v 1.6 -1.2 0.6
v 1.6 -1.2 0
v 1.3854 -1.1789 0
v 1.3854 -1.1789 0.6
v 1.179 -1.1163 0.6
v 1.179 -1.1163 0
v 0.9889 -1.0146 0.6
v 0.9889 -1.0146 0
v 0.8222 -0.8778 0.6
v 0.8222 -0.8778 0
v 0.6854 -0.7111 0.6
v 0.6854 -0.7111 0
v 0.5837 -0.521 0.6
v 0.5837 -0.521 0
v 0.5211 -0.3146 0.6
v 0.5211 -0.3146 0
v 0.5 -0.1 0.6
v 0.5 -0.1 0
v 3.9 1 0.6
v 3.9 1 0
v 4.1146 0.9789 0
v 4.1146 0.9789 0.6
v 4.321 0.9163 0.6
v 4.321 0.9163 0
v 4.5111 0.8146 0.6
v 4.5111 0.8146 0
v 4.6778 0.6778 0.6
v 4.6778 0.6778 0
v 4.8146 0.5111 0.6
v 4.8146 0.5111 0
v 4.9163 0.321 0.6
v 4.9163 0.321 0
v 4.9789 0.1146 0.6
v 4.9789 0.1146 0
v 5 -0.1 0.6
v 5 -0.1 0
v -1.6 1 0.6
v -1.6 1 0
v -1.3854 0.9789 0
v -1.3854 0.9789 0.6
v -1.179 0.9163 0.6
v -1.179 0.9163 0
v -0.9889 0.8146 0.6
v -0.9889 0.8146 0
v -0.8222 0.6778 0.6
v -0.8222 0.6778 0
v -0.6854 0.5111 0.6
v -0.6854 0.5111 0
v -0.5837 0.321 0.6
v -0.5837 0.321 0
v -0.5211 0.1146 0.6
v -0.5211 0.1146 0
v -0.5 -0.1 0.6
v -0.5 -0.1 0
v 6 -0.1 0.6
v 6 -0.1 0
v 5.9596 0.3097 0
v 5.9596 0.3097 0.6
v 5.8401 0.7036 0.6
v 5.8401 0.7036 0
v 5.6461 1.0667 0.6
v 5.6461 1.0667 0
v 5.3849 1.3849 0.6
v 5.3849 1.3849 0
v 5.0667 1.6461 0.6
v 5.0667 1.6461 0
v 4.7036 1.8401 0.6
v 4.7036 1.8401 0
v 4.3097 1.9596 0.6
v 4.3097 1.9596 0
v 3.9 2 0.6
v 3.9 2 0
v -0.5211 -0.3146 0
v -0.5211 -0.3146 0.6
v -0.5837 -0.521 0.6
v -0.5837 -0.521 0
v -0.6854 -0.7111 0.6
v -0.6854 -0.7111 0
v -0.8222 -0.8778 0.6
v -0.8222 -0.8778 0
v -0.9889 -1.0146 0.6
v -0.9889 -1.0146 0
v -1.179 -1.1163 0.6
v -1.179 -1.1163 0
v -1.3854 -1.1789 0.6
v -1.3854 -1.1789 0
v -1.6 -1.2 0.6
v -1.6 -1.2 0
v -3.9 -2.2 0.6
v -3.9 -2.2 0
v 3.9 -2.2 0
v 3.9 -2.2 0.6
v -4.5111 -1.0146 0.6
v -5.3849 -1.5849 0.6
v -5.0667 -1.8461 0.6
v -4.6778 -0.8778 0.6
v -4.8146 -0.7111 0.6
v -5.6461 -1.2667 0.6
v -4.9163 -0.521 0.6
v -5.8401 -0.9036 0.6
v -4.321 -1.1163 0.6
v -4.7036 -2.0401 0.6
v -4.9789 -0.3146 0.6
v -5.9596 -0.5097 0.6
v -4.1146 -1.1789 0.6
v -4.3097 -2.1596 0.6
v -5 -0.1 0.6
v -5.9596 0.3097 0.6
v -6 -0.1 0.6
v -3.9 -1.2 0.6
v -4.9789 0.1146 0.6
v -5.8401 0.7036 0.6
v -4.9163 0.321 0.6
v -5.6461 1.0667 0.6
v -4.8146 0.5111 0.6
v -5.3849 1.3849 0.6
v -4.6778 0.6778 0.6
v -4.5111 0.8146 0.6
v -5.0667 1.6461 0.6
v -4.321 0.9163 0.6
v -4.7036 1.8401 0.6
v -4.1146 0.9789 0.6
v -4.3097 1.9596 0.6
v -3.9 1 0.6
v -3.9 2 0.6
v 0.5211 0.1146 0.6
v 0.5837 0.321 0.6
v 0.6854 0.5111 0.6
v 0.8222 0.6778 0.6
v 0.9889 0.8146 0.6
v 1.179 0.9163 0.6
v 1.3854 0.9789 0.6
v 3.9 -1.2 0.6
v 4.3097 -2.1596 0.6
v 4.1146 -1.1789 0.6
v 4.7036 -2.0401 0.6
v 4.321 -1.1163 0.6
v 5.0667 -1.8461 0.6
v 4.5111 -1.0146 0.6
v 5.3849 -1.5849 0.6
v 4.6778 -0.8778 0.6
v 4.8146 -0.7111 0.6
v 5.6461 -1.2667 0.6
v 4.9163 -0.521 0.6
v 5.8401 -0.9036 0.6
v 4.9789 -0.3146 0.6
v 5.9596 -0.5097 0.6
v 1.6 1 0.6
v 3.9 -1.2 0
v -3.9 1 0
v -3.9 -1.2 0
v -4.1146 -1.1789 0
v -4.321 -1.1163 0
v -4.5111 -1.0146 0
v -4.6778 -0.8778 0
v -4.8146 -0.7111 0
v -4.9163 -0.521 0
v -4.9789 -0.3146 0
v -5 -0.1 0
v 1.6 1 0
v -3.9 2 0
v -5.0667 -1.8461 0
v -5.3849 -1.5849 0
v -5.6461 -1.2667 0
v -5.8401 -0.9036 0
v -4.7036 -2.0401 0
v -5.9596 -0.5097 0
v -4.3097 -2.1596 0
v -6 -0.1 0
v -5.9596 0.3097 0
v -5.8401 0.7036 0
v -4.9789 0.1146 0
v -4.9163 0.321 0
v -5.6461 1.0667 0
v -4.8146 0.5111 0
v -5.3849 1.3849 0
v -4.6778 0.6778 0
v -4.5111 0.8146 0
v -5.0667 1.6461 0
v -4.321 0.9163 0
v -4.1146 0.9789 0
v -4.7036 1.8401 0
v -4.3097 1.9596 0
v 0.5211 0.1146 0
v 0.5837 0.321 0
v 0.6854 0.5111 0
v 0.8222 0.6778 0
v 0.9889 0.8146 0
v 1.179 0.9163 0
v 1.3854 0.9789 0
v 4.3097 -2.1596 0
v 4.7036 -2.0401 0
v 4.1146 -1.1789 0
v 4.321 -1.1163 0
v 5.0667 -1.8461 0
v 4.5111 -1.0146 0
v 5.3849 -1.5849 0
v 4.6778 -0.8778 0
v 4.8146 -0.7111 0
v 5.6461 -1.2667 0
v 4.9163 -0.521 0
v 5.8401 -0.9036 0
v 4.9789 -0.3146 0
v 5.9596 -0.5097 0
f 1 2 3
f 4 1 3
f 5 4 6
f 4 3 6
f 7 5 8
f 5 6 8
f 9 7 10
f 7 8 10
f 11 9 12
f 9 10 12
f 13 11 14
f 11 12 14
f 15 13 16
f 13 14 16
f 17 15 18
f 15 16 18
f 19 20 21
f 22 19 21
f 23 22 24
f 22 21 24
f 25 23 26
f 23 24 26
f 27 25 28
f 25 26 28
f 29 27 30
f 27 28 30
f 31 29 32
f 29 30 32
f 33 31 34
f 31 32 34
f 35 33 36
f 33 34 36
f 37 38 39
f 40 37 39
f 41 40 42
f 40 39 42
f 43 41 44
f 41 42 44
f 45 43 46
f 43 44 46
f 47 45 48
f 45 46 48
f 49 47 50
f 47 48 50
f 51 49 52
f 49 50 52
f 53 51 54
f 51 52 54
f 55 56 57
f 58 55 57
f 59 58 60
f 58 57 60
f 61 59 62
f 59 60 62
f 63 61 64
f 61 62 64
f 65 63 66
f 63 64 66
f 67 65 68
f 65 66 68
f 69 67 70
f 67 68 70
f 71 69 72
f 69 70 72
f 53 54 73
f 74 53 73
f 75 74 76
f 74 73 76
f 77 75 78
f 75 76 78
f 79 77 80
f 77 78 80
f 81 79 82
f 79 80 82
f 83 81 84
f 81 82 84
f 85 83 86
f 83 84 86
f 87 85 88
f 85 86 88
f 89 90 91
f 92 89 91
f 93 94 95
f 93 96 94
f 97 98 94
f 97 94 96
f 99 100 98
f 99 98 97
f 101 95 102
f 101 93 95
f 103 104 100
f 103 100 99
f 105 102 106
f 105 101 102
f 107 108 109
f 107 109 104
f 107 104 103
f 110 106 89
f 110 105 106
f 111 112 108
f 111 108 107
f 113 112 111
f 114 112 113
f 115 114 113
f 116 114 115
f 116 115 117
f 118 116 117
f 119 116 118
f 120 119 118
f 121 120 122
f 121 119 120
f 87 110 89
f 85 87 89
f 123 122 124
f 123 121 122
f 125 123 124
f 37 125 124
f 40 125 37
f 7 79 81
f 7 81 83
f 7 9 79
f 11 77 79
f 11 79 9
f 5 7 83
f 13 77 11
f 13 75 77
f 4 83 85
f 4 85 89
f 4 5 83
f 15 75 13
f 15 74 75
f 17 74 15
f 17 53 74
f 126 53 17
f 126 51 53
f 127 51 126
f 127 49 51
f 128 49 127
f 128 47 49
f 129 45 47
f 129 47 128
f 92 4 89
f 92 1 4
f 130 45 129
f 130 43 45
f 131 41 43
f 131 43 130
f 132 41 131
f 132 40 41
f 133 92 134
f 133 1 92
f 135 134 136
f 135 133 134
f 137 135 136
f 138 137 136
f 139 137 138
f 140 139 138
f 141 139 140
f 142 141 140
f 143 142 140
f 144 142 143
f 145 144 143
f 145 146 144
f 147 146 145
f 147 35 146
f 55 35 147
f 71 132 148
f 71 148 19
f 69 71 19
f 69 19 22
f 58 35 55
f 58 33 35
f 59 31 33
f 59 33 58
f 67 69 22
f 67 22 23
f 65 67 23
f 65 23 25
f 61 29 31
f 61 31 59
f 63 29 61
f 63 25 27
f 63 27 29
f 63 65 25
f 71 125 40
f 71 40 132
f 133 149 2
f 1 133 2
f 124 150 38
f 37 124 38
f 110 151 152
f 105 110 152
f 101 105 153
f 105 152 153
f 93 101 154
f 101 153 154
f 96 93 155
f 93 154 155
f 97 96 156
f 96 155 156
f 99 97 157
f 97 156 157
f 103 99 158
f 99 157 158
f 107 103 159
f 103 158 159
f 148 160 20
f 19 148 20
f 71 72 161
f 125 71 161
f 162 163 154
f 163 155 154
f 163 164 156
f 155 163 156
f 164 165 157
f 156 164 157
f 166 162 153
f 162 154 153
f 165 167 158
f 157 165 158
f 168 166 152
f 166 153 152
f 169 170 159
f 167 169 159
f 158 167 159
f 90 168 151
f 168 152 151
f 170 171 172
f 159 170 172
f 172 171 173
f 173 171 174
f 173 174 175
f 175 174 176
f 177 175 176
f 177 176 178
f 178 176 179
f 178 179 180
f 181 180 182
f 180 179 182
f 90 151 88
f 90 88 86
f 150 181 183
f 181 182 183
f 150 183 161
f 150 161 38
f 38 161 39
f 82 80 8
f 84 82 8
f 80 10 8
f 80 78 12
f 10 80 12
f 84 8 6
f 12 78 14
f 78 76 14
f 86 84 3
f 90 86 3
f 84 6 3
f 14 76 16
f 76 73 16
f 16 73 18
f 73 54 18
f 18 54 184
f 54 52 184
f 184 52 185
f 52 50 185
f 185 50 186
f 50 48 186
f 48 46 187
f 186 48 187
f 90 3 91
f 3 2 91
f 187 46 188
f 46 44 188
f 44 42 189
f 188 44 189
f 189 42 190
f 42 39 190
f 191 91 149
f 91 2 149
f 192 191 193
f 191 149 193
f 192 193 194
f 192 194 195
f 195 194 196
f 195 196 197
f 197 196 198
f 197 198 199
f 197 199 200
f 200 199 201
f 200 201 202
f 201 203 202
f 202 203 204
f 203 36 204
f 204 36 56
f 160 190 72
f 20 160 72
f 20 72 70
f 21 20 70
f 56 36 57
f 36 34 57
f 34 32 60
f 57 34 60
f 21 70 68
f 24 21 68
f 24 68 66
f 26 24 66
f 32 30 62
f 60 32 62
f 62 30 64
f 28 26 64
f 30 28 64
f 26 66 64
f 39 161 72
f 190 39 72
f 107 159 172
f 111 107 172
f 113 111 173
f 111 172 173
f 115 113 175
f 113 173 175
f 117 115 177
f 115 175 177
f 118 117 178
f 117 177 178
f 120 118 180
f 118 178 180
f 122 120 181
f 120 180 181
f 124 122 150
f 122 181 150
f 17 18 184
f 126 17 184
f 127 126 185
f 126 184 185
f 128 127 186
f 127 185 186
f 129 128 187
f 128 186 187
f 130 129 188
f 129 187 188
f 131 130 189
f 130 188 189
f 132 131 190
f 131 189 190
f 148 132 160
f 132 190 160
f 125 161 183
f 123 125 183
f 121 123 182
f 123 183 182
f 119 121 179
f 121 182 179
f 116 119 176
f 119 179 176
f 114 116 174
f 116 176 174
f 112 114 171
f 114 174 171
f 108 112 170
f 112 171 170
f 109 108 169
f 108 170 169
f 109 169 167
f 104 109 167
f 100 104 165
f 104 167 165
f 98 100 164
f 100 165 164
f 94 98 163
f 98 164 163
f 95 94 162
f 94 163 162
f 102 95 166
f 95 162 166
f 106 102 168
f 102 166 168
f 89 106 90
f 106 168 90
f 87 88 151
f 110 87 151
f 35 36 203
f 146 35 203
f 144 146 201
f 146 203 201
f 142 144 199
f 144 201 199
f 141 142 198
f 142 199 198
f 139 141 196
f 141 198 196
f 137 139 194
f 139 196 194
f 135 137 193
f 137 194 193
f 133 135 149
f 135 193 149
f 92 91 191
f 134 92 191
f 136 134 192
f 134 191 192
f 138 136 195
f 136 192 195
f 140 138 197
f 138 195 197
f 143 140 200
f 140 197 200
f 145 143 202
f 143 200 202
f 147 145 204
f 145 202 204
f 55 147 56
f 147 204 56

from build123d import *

# Parameters (mm, degrees)
F1_DEPTH = 0.6


with BuildPart() as f1:
    # F0 (on Top) → F1 (new body)
    with BuildSketch(Plane.XY):
        with BuildLine():
            Line((3.9, 2), (-3.9, 2))
            ThreePointArc((-3.9, 2), (-5.384924, 1.384924), (-6, -0.1))
            ThreePointArc((-6, -0.1), (-5.384924, -1.584924), (-3.9, -2.2))
            Line((-3.9, -2.2), (3.9, -2.2))
            ThreePointArc((3.9, -2.2), (5.384924, -1.584924), (6, -0.1))
            ThreePointArc((6, -0.1), (5.384924, 1.384924), (3.9, 2))
        make_face()
        with BuildLine():
            ThreePointArc((-5, -0.1), (-4.677817, 0.677817), (-3.9, 1))
            Line((-3.9, 1), (-1.6, 1))
            ThreePointArc((-1.6, 1), (-0.822183, 0.677817), (-0.5, -0.1))
            ThreePointArc((-0.5, -0.1), (-0.822183, -0.877817), (-1.6, -1.2))
            Line((-1.6, -1.2), (-3.9, -1.2))
            ThreePointArc((-3.9, -1.2), (-4.677817, -0.877817), (-5, -0.1))
        make_face(mode=Mode.SUBTRACT)
        with BuildLine():
            ThreePointArc((0.5, -0.1), (0.822183, 0.677817), (1.6, 1))
            Line((1.6, 1), (3.9, 1))
            ThreePointArc((3.9, 1), (4.677817, 0.677817), (5, -0.1))
            ThreePointArc((5, -0.1), (4.677817, -0.877817), (3.9, -1.2))
            Line((3.9, -1.2), (1.6, -1.2))
            ThreePointArc((1.6, -1.2), (0.822183, -0.877817), (0.5, -0.1))
        make_face(mode=Mode.SUBTRACT)
    extrude(amount=F1_DEPTH)


solid = f1.part
